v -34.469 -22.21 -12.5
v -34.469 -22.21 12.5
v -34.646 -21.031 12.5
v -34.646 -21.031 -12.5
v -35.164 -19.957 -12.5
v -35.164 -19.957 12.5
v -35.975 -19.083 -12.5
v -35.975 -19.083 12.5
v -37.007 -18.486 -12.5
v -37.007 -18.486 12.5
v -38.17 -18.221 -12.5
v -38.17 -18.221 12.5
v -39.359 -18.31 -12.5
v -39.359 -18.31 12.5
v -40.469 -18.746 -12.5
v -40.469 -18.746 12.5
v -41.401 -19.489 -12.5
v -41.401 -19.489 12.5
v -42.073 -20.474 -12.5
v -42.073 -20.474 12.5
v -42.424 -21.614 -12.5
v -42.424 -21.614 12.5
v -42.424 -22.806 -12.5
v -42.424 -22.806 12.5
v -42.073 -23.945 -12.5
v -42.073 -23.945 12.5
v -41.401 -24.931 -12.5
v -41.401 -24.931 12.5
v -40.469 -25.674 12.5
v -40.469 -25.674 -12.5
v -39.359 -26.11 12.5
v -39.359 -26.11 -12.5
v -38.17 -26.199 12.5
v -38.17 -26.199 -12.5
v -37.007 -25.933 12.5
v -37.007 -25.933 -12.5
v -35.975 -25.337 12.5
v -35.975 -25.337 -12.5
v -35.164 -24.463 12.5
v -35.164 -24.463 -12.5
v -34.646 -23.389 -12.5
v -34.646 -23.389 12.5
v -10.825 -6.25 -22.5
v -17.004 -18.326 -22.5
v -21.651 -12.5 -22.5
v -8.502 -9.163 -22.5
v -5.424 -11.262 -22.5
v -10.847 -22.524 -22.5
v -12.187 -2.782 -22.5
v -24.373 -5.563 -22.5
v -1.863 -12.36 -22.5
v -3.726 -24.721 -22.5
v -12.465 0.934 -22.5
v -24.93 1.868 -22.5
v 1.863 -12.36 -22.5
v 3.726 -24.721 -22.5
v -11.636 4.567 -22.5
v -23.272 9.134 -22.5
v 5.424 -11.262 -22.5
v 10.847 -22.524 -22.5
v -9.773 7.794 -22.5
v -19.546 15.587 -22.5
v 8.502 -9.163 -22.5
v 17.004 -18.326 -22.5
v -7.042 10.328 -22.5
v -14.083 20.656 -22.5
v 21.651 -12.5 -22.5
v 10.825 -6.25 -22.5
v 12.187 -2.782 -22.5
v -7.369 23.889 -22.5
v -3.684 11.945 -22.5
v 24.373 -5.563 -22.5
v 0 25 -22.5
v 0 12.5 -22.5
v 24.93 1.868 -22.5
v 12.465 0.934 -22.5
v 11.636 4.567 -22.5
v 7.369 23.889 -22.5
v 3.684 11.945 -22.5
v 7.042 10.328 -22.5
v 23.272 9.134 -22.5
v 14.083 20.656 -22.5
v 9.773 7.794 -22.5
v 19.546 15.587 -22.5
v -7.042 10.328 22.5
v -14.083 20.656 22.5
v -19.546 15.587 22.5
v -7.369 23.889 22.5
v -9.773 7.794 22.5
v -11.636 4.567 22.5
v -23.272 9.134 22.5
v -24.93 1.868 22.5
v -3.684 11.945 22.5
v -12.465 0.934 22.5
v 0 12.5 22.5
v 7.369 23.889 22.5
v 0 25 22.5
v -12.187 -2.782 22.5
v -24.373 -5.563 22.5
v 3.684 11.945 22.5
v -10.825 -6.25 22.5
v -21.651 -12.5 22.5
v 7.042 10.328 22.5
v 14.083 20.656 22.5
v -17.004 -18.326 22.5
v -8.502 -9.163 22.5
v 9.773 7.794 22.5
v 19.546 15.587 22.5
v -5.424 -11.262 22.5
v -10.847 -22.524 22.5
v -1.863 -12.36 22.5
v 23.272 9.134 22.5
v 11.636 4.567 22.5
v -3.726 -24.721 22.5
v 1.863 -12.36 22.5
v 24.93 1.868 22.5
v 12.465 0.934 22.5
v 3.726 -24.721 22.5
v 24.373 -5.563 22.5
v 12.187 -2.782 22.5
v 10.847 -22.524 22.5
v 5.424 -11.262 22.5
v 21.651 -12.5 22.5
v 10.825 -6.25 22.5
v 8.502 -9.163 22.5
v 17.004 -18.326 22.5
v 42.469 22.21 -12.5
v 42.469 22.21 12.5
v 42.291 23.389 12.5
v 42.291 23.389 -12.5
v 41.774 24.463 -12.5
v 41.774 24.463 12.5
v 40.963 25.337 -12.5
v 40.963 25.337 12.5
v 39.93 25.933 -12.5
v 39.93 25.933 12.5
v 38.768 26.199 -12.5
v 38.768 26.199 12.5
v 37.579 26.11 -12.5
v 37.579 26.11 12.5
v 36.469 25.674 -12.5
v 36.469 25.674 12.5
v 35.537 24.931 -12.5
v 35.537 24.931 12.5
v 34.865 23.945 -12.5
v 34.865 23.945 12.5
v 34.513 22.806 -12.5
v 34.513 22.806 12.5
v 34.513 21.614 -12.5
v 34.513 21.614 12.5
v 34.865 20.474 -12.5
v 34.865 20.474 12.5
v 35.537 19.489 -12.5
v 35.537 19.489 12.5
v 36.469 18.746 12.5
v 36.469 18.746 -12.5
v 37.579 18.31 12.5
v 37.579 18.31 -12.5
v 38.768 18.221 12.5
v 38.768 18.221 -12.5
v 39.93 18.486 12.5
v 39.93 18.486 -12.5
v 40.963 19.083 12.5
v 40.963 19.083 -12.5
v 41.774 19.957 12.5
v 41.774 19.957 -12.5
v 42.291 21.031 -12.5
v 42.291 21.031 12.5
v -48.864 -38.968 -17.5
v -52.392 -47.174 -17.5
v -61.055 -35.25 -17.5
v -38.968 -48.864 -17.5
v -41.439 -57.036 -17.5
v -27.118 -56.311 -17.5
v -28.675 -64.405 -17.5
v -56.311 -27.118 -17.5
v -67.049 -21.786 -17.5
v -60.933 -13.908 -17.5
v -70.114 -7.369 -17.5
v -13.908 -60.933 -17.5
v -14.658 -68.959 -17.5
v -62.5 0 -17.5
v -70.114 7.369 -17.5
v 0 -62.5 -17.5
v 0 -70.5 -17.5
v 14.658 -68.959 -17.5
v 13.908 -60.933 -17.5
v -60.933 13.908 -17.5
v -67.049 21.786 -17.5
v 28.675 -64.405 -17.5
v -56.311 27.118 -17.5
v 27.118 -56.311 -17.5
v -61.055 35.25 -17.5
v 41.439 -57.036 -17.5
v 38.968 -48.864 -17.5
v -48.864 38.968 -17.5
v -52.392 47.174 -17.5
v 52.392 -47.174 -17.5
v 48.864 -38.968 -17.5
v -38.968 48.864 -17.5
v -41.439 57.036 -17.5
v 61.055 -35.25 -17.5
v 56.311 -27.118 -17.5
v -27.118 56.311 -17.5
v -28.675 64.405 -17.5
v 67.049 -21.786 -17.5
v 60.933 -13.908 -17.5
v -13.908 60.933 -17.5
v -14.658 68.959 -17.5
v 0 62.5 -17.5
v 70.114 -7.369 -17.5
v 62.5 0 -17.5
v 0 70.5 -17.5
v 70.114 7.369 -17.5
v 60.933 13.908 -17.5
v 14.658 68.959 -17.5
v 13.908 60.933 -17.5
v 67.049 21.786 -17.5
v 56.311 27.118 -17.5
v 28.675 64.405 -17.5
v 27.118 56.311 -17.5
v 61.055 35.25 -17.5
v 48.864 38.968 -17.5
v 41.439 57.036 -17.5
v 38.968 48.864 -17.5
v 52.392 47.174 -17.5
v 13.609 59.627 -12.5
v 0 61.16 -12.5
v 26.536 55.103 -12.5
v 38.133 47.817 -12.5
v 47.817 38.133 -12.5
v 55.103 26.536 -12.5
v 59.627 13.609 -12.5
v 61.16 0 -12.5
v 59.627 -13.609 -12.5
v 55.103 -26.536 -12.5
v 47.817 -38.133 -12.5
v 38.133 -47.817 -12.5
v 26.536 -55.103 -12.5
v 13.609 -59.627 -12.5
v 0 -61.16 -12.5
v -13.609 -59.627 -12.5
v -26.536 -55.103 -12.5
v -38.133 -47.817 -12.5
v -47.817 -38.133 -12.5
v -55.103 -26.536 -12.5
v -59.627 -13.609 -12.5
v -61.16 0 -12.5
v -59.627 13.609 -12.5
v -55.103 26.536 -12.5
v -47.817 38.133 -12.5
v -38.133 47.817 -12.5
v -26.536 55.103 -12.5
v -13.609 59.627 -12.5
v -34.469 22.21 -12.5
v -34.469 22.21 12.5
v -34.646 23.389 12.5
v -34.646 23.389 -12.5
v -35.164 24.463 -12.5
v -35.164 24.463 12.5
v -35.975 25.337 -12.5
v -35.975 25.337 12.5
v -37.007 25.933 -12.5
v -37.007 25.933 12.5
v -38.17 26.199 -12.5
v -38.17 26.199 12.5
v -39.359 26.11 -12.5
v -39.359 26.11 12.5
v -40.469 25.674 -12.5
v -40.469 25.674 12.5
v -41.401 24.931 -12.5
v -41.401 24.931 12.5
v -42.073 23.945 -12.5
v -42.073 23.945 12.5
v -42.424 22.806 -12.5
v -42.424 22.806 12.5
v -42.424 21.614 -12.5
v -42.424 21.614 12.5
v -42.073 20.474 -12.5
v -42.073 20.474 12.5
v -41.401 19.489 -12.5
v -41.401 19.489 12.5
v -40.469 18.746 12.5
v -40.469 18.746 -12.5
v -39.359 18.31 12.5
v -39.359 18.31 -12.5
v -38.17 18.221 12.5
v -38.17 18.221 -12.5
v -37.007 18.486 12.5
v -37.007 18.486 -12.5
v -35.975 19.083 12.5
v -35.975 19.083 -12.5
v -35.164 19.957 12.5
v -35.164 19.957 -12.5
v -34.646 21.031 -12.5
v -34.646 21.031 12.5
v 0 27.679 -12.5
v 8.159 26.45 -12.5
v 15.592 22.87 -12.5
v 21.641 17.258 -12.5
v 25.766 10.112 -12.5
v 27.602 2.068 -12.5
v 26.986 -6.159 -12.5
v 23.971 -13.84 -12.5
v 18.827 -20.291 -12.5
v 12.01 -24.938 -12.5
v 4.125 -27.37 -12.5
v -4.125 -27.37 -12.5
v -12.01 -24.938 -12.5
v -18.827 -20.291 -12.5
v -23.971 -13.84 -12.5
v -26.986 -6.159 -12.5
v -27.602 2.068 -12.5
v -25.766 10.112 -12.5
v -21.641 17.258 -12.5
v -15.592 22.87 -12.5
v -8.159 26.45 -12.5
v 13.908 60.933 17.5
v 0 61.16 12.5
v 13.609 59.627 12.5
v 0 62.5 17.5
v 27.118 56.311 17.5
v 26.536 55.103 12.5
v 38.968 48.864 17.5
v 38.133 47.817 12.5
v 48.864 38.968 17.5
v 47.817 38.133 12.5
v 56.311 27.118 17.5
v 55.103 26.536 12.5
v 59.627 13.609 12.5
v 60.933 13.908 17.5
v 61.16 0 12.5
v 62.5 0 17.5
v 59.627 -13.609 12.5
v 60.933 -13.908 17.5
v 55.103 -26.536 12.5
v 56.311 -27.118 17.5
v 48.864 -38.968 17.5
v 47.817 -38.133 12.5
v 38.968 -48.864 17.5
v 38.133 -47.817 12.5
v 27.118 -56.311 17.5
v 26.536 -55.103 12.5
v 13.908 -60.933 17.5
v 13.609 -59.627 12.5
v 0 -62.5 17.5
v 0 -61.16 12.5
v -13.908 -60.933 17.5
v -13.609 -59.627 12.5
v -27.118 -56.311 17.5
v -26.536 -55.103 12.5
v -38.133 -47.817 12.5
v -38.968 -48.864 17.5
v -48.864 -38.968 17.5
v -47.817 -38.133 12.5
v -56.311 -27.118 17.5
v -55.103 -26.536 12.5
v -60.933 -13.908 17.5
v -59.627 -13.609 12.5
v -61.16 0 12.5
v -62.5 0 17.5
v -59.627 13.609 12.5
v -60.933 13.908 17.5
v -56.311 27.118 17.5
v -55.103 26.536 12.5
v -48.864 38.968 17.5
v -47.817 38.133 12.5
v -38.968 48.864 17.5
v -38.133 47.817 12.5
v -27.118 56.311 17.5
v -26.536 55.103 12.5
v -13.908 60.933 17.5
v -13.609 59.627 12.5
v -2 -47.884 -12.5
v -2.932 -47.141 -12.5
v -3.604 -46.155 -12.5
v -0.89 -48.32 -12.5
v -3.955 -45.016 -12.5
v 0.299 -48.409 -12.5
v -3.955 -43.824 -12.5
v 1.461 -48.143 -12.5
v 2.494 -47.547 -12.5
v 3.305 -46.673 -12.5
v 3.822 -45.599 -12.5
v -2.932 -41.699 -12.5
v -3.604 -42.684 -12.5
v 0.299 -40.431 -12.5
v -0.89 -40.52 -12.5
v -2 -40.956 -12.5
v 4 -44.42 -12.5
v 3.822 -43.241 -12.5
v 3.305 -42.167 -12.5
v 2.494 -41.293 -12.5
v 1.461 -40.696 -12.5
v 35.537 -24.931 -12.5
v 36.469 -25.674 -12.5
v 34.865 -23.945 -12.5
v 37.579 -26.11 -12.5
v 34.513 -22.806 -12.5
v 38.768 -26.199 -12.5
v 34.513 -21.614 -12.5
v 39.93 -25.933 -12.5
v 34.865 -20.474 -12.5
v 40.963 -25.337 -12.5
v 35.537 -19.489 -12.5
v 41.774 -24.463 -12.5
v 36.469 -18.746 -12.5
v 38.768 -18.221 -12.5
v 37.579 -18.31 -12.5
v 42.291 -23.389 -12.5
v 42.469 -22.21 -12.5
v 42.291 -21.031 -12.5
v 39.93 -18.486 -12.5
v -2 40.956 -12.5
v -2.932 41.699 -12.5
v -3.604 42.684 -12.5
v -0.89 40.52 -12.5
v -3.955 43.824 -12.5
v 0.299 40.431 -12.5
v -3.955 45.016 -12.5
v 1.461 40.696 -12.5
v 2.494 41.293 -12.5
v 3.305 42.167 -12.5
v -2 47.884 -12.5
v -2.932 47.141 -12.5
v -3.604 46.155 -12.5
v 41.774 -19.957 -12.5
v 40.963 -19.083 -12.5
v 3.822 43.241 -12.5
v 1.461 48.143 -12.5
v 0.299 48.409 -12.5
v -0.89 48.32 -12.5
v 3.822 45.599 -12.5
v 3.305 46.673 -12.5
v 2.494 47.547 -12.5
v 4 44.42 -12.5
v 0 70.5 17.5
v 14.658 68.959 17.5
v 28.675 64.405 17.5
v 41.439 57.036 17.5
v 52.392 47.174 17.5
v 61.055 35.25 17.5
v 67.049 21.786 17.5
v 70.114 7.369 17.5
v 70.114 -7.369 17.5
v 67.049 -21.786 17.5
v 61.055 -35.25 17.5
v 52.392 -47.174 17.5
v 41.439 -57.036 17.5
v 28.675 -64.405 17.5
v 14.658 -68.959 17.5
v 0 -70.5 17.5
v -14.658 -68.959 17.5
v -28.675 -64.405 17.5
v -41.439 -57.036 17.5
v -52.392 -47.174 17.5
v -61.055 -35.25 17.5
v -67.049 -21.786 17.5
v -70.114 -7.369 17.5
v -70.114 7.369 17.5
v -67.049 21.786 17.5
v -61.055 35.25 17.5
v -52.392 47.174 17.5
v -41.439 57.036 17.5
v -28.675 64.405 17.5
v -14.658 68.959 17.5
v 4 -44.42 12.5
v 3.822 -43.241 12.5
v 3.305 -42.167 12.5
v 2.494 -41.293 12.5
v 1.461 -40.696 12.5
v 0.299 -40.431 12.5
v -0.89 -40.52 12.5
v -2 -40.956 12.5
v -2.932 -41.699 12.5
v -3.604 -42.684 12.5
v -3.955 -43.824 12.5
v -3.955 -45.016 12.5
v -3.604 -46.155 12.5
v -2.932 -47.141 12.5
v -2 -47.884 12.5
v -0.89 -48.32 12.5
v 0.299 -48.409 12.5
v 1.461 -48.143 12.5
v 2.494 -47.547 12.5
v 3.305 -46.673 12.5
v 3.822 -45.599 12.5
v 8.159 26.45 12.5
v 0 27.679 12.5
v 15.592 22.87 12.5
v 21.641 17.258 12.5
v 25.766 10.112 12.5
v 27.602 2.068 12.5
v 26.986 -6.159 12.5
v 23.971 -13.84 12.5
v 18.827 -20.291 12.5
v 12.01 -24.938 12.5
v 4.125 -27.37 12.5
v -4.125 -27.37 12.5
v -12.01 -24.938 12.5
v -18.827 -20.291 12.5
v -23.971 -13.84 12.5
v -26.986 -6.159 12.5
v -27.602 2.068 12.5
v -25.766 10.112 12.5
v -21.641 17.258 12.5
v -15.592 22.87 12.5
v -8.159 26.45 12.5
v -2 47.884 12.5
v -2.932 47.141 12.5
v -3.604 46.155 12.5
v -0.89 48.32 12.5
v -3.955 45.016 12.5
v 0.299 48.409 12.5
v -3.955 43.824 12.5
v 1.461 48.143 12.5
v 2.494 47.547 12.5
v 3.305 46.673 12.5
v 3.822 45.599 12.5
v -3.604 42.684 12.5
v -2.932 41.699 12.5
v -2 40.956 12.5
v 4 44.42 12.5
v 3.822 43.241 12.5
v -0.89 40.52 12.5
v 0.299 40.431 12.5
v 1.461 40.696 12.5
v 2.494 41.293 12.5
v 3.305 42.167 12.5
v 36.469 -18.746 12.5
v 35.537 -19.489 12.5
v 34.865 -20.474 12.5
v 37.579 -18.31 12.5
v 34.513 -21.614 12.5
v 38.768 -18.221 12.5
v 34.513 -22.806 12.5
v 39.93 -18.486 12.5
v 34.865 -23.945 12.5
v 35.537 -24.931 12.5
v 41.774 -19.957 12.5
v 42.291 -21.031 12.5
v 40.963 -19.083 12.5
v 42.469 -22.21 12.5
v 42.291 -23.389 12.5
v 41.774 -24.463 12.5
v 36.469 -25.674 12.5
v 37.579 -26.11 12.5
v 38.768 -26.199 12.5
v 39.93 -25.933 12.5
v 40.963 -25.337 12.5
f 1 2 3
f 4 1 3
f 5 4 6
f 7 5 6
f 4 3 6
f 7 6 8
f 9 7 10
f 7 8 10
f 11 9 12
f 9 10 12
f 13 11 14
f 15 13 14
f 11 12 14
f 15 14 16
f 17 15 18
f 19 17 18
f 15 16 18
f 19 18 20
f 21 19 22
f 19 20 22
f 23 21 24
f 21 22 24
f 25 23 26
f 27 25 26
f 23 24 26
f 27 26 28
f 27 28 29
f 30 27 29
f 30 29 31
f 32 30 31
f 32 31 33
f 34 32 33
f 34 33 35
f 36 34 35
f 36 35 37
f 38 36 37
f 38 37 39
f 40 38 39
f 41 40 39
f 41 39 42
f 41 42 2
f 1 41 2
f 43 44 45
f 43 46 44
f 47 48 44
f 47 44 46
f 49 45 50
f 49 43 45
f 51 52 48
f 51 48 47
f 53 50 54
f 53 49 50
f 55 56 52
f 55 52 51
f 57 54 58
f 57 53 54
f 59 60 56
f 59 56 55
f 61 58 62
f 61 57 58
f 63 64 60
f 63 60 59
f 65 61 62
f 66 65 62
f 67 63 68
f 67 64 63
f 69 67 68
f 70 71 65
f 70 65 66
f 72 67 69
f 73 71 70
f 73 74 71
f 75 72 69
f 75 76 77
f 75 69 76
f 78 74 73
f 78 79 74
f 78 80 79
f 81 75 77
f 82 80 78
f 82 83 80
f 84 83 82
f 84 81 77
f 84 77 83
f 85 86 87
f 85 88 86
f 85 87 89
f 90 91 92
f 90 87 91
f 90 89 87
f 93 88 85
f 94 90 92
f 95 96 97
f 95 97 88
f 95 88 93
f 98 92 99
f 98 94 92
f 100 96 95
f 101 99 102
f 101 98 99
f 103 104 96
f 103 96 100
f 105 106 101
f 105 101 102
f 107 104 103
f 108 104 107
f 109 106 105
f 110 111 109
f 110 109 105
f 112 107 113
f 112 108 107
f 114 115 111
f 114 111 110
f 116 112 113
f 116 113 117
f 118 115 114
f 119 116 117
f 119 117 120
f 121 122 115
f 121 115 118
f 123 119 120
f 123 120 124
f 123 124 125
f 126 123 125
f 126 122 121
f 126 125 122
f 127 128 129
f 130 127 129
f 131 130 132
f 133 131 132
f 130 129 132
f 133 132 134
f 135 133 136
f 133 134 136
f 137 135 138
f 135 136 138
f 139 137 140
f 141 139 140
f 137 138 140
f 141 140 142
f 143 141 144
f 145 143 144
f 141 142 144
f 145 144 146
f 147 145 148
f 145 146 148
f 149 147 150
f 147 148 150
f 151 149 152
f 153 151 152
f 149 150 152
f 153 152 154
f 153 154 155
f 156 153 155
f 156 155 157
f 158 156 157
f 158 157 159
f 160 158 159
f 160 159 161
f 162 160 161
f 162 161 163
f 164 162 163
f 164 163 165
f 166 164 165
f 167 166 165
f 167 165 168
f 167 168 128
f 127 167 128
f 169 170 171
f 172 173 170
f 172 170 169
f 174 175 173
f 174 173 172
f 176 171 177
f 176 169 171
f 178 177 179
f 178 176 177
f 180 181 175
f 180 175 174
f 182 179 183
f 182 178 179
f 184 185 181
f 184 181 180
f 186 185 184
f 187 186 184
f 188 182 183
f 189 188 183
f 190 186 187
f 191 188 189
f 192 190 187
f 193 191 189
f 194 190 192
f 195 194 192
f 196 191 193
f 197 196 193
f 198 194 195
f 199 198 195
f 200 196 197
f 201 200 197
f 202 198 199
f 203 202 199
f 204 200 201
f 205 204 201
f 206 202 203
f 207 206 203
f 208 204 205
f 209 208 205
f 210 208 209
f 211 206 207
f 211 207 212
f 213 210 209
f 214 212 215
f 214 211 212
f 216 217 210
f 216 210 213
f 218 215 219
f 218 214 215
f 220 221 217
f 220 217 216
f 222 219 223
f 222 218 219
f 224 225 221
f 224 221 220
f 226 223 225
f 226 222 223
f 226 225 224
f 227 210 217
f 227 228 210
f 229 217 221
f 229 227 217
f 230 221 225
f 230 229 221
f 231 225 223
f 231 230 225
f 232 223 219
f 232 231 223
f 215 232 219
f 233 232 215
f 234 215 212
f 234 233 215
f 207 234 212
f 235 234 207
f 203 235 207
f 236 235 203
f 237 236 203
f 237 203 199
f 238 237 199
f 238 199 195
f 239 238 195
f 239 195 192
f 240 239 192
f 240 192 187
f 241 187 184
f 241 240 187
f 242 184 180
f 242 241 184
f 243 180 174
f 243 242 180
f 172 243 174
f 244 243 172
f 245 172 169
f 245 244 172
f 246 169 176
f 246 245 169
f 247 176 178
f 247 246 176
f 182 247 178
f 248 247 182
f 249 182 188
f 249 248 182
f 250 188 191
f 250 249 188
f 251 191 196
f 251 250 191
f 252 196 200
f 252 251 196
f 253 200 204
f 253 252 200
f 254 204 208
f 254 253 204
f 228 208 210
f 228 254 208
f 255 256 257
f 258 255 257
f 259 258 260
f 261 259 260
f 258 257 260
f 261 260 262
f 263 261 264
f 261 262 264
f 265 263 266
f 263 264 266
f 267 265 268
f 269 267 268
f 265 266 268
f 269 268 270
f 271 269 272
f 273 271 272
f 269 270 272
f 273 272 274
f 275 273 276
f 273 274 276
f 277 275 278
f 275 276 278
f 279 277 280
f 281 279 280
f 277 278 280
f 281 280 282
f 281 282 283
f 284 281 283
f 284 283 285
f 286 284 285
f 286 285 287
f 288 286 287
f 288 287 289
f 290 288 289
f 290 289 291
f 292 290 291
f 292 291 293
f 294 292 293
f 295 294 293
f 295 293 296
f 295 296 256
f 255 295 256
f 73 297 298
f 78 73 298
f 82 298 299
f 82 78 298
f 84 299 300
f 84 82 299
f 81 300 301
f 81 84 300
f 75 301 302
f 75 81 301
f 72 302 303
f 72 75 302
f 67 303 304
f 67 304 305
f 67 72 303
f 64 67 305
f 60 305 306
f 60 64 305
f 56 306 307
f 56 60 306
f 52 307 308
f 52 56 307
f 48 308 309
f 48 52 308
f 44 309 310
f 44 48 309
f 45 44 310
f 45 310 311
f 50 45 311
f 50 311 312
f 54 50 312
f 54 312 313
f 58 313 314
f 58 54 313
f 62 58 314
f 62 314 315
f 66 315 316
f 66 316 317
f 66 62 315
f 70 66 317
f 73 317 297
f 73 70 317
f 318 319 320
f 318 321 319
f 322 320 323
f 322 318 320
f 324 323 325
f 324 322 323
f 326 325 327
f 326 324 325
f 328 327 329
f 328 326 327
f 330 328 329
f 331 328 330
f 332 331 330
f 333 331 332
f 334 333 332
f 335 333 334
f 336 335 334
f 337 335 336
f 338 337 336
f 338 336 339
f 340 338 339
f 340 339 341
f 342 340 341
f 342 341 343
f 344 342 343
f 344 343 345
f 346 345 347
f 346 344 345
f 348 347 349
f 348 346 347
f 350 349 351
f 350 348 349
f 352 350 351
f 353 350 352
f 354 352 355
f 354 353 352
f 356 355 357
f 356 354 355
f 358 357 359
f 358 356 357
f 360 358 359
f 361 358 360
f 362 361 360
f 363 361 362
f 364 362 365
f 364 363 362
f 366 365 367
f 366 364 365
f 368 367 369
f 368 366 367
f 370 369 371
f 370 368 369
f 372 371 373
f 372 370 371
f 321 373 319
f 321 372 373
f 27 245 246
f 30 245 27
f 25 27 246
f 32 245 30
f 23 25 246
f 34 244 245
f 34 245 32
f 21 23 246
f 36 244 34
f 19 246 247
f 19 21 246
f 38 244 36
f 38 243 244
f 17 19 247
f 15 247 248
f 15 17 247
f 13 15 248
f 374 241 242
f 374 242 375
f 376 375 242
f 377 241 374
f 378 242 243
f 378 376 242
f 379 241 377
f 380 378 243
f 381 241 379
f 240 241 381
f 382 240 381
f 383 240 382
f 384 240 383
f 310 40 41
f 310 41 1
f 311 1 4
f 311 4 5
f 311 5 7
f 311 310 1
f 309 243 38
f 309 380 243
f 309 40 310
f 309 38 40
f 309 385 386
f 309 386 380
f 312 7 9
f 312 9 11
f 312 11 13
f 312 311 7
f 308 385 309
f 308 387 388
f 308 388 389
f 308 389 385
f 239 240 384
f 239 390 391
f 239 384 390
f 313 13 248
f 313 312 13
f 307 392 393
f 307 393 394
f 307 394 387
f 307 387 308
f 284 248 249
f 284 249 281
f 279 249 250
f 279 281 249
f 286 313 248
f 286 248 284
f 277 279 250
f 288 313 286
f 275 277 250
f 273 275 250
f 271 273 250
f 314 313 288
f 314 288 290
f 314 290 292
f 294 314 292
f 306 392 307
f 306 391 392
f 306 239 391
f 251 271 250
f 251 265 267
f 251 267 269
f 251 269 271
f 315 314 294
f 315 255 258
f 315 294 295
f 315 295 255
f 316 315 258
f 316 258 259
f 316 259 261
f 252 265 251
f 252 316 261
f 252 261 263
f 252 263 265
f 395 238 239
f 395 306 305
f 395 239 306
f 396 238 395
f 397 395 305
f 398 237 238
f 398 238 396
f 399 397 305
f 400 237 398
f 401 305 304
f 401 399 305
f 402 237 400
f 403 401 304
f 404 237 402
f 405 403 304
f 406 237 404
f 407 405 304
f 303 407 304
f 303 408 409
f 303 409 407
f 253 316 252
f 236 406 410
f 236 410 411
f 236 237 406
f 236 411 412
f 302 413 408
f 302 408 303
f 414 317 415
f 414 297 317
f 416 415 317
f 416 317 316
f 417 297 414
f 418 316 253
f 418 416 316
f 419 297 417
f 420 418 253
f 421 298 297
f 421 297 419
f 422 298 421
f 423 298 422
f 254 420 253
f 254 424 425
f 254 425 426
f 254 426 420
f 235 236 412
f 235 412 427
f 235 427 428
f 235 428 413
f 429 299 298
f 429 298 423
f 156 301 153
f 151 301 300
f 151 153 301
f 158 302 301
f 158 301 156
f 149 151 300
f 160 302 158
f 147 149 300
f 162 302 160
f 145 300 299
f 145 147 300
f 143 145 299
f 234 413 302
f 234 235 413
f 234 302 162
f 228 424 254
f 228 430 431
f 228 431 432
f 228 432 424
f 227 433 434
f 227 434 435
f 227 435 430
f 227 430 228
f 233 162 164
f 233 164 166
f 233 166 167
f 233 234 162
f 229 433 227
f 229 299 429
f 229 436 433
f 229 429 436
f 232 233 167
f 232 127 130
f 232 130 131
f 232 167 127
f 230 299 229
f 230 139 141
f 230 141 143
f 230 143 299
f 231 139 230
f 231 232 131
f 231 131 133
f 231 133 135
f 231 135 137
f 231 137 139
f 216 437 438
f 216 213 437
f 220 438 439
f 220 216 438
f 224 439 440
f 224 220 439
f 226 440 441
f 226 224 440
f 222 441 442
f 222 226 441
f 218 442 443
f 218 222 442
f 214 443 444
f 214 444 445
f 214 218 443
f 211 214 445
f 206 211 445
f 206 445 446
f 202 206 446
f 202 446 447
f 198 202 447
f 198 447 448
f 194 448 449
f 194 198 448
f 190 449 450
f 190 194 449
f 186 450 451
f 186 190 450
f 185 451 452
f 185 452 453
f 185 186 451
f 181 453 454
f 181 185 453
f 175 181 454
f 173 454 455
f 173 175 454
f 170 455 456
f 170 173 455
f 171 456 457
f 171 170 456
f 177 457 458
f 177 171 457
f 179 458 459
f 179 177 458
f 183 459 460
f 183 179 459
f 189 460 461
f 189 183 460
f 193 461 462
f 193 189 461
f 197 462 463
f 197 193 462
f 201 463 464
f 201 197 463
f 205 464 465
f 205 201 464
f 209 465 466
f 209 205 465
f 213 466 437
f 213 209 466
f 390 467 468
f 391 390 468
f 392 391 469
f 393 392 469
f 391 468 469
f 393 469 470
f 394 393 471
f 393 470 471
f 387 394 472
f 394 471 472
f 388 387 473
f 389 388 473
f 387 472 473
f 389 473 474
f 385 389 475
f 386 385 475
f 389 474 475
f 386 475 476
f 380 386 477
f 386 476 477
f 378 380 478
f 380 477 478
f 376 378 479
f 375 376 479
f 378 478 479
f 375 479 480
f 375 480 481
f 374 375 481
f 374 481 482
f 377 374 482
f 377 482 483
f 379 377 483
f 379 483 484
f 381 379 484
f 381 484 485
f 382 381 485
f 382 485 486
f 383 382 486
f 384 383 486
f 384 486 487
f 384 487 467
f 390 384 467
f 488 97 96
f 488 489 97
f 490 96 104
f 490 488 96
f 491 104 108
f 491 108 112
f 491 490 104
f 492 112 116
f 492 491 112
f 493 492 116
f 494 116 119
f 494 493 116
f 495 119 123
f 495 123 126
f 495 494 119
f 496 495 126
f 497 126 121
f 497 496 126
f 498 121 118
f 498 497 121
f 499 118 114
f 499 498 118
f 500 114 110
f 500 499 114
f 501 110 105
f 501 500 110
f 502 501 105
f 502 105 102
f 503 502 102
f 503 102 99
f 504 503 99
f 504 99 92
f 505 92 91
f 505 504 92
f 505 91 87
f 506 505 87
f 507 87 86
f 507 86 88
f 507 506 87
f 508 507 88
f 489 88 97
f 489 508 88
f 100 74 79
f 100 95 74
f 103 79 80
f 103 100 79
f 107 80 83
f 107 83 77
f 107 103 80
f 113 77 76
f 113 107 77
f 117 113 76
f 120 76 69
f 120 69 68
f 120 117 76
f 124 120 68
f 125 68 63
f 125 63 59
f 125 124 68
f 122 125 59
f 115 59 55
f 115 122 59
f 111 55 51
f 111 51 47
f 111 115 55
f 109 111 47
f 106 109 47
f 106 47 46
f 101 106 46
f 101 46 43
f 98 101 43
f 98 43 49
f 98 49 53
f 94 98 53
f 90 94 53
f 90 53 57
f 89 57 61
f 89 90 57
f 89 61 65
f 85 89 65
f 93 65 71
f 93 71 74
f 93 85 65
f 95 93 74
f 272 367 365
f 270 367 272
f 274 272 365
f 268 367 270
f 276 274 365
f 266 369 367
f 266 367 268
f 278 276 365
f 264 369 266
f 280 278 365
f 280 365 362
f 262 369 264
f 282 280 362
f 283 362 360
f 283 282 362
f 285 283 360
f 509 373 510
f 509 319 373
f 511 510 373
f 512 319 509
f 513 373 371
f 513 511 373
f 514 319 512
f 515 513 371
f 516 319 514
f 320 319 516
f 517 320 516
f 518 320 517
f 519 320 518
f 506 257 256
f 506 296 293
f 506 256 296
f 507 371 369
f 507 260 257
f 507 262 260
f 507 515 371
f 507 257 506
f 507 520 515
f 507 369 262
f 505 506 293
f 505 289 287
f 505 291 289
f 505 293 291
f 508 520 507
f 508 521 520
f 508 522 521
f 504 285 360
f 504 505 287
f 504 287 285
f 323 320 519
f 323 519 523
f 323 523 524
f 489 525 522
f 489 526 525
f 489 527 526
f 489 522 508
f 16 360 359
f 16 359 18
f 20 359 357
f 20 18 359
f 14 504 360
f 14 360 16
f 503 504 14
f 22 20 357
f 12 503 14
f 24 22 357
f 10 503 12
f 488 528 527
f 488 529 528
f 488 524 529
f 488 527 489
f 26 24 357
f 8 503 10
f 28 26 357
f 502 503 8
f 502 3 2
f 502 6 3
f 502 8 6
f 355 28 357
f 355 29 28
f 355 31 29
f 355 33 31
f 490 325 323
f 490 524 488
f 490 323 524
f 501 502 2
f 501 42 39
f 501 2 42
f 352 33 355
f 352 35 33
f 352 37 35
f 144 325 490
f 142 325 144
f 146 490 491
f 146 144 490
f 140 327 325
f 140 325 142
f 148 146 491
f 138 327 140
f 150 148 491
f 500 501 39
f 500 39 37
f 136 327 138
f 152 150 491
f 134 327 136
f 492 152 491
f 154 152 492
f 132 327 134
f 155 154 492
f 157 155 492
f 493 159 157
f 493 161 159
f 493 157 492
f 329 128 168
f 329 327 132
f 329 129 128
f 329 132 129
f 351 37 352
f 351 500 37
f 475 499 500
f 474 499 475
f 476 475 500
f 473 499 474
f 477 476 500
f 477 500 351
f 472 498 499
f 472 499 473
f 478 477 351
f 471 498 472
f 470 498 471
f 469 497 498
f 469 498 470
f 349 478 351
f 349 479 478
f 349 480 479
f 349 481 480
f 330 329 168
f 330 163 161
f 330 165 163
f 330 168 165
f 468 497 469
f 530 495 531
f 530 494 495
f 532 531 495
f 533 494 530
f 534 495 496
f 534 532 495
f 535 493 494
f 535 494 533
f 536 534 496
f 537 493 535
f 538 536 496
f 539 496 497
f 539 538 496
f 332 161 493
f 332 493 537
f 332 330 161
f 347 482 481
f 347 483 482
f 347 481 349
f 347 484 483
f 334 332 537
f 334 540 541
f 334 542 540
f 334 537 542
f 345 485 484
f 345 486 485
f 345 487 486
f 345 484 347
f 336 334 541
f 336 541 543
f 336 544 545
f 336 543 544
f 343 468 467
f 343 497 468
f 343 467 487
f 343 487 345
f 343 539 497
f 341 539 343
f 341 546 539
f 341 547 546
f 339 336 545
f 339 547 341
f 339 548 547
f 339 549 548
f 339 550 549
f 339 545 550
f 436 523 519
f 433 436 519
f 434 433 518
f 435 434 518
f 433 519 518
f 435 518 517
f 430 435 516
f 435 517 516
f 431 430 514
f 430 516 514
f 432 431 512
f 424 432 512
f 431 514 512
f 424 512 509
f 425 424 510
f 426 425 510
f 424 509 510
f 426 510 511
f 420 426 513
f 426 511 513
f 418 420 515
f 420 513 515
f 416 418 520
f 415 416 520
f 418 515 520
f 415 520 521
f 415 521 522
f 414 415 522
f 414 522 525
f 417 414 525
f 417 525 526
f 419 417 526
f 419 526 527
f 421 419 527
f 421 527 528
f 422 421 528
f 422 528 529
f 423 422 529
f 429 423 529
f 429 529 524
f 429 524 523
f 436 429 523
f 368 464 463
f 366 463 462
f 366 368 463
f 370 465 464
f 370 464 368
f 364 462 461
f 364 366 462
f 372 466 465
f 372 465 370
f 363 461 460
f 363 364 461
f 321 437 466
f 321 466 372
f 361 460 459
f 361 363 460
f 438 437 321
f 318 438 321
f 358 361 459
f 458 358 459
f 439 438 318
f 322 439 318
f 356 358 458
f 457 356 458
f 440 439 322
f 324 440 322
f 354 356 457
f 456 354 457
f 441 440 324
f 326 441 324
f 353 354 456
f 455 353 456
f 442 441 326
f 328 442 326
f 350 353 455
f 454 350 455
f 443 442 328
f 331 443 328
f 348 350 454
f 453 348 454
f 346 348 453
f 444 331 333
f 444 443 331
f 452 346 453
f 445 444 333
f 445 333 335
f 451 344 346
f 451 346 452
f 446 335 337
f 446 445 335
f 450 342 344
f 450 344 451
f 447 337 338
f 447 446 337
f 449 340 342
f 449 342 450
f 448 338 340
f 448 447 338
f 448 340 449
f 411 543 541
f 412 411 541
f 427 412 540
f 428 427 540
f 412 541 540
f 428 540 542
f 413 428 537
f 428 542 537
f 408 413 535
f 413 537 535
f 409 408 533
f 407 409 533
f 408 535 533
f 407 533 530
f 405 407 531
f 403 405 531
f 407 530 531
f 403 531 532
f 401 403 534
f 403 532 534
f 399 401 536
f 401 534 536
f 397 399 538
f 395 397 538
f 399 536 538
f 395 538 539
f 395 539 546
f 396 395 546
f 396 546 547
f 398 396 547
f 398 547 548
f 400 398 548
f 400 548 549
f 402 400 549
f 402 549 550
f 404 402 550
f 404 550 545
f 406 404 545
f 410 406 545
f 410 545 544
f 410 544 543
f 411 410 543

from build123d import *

# Parameters (mm, degrees)
CUT_EXTRUDE2_REACH = 37
SKETCH9_R          = 4


with BuildPart() as part:
    # Sketch8 → Revolve3 (revolve)
    with BuildSketch(Plane(origin=(0, 0, 0), x_dir=(0, 0, -1), z_dir=(1, 0, 0))):
        Polygon((22.5, 12.5), (-22.5, 12.5), (-22.5, 25), (-12.5, 27.679491924), (-12.5, 61.160254038), (-17.5, 62.5), (-17.5, 70.5), (17.5, 70.5), (17.5, 62.5), (12.5, 61.160254038), (12.5, 27.679491924), (22.5, 25), align=None)
    revolve(axis=Axis((0, 0, 62.265479925), (0, 0, -1)))

    # Sketch9 → Cut-Extrude2 (cut, up to next)
    with BuildSketch(Plane.XY.offset(12.5), mode=Mode.PRIVATE) as cut_extrude2_sk1:
        with Locations((0, 44.419872981)):
            Circle(SKETCH9_R)
    cut_extrude2_tool1 = extrude(cut_extrude2_sk1.sketch, amount=-CUT_EXTRUDE2_REACH, mode=Mode.PRIVATE) & part.part
    add(cut_extrude2_tool1.solids().sort_by_distance((0, 44.419873, 12.5))[0], mode=Mode.SUBTRACT)
    # Sketch9 → Cut-Extrude2 (cut, up to next)
    with BuildSketch(Plane.XY.offset(12.5), mode=Mode.PRIVATE) as cut_extrude2_sk2:
        with Locations((38.468738434, 22.209936491)):
            Circle(SKETCH9_R)
    cut_extrude2_tool2 = extrude(cut_extrude2_sk2.sketch, amount=-CUT_EXTRUDE2_REACH, mode=Mode.PRIVATE) & part.part
    add(cut_extrude2_tool2.solids().sort_by_distance((38.468738, 22.209936, 12.5))[0], mode=Mode.SUBTRACT)
    # Sketch9 → Cut-Extrude2 (cut, up to next)
    with BuildSketch(Plane.XY.offset(12.5), mode=Mode.PRIVATE) as cut_extrude2_sk3:
        with Locations((38.468738434, -22.209936491)):
            Circle(SKETCH9_R)
    cut_extrude2_tool3 = extrude(cut_extrude2_sk3.sketch, amount=-CUT_EXTRUDE2_REACH, mode=Mode.PRIVATE) & part.part
    add(cut_extrude2_tool3.solids().sort_by_distance((38.468738, -22.209936, 12.5))[0], mode=Mode.SUBTRACT)
    # Sketch9 → Cut-Extrude2 (cut, up to next)
    with BuildSketch(Plane.XY.offset(12.5), mode=Mode.PRIVATE) as cut_extrude2_sk4:
        with Locations((0, -44.419872981)):
            Circle(SKETCH9_R)
    cut_extrude2_tool4 = extrude(cut_extrude2_sk4.sketch, amount=-CUT_EXTRUDE2_REACH, mode=Mode.PRIVATE) & part.part
    add(cut_extrude2_tool4.solids().sort_by_distance((0, -44.419873, 12.5))[0], mode=Mode.SUBTRACT)
    # Sketch9 → Cut-Extrude2 (cut, up to next)
    with BuildSketch(Plane.XY.offset(12.5), mode=Mode.PRIVATE) as cut_extrude2_sk5:
        with Locations((-38.468738434, -22.209936491)):
            Circle(SKETCH9_R)
    cut_extrude2_tool5 = extrude(cut_extrude2_sk5.sketch, amount=-CUT_EXTRUDE2_REACH, mode=Mode.PRIVATE) & part.part
    add(cut_extrude2_tool5.solids().sort_by_distance((-38.468738, -22.209936, 12.5))[0], mode=Mode.SUBTRACT)
    # Sketch9 → Cut-Extrude2 (cut, up to next)
    with BuildSketch(Plane.XY.offset(12.5), mode=Mode.PRIVATE) as cut_extrude2_sk6:
        with Locations((-38.468738434, 22.209936491)):
            Circle(SKETCH9_R)
    cut_extrude2_tool6 = extrude(cut_extrude2_sk6.sketch, amount=-CUT_EXTRUDE2_REACH, mode=Mode.PRIVATE) & part.part
    add(cut_extrude2_tool6.solids().sort_by_distance((-38.468738, 22.209936, 12.5))[0], mode=Mode.SUBTRACT)


solid = part.part
